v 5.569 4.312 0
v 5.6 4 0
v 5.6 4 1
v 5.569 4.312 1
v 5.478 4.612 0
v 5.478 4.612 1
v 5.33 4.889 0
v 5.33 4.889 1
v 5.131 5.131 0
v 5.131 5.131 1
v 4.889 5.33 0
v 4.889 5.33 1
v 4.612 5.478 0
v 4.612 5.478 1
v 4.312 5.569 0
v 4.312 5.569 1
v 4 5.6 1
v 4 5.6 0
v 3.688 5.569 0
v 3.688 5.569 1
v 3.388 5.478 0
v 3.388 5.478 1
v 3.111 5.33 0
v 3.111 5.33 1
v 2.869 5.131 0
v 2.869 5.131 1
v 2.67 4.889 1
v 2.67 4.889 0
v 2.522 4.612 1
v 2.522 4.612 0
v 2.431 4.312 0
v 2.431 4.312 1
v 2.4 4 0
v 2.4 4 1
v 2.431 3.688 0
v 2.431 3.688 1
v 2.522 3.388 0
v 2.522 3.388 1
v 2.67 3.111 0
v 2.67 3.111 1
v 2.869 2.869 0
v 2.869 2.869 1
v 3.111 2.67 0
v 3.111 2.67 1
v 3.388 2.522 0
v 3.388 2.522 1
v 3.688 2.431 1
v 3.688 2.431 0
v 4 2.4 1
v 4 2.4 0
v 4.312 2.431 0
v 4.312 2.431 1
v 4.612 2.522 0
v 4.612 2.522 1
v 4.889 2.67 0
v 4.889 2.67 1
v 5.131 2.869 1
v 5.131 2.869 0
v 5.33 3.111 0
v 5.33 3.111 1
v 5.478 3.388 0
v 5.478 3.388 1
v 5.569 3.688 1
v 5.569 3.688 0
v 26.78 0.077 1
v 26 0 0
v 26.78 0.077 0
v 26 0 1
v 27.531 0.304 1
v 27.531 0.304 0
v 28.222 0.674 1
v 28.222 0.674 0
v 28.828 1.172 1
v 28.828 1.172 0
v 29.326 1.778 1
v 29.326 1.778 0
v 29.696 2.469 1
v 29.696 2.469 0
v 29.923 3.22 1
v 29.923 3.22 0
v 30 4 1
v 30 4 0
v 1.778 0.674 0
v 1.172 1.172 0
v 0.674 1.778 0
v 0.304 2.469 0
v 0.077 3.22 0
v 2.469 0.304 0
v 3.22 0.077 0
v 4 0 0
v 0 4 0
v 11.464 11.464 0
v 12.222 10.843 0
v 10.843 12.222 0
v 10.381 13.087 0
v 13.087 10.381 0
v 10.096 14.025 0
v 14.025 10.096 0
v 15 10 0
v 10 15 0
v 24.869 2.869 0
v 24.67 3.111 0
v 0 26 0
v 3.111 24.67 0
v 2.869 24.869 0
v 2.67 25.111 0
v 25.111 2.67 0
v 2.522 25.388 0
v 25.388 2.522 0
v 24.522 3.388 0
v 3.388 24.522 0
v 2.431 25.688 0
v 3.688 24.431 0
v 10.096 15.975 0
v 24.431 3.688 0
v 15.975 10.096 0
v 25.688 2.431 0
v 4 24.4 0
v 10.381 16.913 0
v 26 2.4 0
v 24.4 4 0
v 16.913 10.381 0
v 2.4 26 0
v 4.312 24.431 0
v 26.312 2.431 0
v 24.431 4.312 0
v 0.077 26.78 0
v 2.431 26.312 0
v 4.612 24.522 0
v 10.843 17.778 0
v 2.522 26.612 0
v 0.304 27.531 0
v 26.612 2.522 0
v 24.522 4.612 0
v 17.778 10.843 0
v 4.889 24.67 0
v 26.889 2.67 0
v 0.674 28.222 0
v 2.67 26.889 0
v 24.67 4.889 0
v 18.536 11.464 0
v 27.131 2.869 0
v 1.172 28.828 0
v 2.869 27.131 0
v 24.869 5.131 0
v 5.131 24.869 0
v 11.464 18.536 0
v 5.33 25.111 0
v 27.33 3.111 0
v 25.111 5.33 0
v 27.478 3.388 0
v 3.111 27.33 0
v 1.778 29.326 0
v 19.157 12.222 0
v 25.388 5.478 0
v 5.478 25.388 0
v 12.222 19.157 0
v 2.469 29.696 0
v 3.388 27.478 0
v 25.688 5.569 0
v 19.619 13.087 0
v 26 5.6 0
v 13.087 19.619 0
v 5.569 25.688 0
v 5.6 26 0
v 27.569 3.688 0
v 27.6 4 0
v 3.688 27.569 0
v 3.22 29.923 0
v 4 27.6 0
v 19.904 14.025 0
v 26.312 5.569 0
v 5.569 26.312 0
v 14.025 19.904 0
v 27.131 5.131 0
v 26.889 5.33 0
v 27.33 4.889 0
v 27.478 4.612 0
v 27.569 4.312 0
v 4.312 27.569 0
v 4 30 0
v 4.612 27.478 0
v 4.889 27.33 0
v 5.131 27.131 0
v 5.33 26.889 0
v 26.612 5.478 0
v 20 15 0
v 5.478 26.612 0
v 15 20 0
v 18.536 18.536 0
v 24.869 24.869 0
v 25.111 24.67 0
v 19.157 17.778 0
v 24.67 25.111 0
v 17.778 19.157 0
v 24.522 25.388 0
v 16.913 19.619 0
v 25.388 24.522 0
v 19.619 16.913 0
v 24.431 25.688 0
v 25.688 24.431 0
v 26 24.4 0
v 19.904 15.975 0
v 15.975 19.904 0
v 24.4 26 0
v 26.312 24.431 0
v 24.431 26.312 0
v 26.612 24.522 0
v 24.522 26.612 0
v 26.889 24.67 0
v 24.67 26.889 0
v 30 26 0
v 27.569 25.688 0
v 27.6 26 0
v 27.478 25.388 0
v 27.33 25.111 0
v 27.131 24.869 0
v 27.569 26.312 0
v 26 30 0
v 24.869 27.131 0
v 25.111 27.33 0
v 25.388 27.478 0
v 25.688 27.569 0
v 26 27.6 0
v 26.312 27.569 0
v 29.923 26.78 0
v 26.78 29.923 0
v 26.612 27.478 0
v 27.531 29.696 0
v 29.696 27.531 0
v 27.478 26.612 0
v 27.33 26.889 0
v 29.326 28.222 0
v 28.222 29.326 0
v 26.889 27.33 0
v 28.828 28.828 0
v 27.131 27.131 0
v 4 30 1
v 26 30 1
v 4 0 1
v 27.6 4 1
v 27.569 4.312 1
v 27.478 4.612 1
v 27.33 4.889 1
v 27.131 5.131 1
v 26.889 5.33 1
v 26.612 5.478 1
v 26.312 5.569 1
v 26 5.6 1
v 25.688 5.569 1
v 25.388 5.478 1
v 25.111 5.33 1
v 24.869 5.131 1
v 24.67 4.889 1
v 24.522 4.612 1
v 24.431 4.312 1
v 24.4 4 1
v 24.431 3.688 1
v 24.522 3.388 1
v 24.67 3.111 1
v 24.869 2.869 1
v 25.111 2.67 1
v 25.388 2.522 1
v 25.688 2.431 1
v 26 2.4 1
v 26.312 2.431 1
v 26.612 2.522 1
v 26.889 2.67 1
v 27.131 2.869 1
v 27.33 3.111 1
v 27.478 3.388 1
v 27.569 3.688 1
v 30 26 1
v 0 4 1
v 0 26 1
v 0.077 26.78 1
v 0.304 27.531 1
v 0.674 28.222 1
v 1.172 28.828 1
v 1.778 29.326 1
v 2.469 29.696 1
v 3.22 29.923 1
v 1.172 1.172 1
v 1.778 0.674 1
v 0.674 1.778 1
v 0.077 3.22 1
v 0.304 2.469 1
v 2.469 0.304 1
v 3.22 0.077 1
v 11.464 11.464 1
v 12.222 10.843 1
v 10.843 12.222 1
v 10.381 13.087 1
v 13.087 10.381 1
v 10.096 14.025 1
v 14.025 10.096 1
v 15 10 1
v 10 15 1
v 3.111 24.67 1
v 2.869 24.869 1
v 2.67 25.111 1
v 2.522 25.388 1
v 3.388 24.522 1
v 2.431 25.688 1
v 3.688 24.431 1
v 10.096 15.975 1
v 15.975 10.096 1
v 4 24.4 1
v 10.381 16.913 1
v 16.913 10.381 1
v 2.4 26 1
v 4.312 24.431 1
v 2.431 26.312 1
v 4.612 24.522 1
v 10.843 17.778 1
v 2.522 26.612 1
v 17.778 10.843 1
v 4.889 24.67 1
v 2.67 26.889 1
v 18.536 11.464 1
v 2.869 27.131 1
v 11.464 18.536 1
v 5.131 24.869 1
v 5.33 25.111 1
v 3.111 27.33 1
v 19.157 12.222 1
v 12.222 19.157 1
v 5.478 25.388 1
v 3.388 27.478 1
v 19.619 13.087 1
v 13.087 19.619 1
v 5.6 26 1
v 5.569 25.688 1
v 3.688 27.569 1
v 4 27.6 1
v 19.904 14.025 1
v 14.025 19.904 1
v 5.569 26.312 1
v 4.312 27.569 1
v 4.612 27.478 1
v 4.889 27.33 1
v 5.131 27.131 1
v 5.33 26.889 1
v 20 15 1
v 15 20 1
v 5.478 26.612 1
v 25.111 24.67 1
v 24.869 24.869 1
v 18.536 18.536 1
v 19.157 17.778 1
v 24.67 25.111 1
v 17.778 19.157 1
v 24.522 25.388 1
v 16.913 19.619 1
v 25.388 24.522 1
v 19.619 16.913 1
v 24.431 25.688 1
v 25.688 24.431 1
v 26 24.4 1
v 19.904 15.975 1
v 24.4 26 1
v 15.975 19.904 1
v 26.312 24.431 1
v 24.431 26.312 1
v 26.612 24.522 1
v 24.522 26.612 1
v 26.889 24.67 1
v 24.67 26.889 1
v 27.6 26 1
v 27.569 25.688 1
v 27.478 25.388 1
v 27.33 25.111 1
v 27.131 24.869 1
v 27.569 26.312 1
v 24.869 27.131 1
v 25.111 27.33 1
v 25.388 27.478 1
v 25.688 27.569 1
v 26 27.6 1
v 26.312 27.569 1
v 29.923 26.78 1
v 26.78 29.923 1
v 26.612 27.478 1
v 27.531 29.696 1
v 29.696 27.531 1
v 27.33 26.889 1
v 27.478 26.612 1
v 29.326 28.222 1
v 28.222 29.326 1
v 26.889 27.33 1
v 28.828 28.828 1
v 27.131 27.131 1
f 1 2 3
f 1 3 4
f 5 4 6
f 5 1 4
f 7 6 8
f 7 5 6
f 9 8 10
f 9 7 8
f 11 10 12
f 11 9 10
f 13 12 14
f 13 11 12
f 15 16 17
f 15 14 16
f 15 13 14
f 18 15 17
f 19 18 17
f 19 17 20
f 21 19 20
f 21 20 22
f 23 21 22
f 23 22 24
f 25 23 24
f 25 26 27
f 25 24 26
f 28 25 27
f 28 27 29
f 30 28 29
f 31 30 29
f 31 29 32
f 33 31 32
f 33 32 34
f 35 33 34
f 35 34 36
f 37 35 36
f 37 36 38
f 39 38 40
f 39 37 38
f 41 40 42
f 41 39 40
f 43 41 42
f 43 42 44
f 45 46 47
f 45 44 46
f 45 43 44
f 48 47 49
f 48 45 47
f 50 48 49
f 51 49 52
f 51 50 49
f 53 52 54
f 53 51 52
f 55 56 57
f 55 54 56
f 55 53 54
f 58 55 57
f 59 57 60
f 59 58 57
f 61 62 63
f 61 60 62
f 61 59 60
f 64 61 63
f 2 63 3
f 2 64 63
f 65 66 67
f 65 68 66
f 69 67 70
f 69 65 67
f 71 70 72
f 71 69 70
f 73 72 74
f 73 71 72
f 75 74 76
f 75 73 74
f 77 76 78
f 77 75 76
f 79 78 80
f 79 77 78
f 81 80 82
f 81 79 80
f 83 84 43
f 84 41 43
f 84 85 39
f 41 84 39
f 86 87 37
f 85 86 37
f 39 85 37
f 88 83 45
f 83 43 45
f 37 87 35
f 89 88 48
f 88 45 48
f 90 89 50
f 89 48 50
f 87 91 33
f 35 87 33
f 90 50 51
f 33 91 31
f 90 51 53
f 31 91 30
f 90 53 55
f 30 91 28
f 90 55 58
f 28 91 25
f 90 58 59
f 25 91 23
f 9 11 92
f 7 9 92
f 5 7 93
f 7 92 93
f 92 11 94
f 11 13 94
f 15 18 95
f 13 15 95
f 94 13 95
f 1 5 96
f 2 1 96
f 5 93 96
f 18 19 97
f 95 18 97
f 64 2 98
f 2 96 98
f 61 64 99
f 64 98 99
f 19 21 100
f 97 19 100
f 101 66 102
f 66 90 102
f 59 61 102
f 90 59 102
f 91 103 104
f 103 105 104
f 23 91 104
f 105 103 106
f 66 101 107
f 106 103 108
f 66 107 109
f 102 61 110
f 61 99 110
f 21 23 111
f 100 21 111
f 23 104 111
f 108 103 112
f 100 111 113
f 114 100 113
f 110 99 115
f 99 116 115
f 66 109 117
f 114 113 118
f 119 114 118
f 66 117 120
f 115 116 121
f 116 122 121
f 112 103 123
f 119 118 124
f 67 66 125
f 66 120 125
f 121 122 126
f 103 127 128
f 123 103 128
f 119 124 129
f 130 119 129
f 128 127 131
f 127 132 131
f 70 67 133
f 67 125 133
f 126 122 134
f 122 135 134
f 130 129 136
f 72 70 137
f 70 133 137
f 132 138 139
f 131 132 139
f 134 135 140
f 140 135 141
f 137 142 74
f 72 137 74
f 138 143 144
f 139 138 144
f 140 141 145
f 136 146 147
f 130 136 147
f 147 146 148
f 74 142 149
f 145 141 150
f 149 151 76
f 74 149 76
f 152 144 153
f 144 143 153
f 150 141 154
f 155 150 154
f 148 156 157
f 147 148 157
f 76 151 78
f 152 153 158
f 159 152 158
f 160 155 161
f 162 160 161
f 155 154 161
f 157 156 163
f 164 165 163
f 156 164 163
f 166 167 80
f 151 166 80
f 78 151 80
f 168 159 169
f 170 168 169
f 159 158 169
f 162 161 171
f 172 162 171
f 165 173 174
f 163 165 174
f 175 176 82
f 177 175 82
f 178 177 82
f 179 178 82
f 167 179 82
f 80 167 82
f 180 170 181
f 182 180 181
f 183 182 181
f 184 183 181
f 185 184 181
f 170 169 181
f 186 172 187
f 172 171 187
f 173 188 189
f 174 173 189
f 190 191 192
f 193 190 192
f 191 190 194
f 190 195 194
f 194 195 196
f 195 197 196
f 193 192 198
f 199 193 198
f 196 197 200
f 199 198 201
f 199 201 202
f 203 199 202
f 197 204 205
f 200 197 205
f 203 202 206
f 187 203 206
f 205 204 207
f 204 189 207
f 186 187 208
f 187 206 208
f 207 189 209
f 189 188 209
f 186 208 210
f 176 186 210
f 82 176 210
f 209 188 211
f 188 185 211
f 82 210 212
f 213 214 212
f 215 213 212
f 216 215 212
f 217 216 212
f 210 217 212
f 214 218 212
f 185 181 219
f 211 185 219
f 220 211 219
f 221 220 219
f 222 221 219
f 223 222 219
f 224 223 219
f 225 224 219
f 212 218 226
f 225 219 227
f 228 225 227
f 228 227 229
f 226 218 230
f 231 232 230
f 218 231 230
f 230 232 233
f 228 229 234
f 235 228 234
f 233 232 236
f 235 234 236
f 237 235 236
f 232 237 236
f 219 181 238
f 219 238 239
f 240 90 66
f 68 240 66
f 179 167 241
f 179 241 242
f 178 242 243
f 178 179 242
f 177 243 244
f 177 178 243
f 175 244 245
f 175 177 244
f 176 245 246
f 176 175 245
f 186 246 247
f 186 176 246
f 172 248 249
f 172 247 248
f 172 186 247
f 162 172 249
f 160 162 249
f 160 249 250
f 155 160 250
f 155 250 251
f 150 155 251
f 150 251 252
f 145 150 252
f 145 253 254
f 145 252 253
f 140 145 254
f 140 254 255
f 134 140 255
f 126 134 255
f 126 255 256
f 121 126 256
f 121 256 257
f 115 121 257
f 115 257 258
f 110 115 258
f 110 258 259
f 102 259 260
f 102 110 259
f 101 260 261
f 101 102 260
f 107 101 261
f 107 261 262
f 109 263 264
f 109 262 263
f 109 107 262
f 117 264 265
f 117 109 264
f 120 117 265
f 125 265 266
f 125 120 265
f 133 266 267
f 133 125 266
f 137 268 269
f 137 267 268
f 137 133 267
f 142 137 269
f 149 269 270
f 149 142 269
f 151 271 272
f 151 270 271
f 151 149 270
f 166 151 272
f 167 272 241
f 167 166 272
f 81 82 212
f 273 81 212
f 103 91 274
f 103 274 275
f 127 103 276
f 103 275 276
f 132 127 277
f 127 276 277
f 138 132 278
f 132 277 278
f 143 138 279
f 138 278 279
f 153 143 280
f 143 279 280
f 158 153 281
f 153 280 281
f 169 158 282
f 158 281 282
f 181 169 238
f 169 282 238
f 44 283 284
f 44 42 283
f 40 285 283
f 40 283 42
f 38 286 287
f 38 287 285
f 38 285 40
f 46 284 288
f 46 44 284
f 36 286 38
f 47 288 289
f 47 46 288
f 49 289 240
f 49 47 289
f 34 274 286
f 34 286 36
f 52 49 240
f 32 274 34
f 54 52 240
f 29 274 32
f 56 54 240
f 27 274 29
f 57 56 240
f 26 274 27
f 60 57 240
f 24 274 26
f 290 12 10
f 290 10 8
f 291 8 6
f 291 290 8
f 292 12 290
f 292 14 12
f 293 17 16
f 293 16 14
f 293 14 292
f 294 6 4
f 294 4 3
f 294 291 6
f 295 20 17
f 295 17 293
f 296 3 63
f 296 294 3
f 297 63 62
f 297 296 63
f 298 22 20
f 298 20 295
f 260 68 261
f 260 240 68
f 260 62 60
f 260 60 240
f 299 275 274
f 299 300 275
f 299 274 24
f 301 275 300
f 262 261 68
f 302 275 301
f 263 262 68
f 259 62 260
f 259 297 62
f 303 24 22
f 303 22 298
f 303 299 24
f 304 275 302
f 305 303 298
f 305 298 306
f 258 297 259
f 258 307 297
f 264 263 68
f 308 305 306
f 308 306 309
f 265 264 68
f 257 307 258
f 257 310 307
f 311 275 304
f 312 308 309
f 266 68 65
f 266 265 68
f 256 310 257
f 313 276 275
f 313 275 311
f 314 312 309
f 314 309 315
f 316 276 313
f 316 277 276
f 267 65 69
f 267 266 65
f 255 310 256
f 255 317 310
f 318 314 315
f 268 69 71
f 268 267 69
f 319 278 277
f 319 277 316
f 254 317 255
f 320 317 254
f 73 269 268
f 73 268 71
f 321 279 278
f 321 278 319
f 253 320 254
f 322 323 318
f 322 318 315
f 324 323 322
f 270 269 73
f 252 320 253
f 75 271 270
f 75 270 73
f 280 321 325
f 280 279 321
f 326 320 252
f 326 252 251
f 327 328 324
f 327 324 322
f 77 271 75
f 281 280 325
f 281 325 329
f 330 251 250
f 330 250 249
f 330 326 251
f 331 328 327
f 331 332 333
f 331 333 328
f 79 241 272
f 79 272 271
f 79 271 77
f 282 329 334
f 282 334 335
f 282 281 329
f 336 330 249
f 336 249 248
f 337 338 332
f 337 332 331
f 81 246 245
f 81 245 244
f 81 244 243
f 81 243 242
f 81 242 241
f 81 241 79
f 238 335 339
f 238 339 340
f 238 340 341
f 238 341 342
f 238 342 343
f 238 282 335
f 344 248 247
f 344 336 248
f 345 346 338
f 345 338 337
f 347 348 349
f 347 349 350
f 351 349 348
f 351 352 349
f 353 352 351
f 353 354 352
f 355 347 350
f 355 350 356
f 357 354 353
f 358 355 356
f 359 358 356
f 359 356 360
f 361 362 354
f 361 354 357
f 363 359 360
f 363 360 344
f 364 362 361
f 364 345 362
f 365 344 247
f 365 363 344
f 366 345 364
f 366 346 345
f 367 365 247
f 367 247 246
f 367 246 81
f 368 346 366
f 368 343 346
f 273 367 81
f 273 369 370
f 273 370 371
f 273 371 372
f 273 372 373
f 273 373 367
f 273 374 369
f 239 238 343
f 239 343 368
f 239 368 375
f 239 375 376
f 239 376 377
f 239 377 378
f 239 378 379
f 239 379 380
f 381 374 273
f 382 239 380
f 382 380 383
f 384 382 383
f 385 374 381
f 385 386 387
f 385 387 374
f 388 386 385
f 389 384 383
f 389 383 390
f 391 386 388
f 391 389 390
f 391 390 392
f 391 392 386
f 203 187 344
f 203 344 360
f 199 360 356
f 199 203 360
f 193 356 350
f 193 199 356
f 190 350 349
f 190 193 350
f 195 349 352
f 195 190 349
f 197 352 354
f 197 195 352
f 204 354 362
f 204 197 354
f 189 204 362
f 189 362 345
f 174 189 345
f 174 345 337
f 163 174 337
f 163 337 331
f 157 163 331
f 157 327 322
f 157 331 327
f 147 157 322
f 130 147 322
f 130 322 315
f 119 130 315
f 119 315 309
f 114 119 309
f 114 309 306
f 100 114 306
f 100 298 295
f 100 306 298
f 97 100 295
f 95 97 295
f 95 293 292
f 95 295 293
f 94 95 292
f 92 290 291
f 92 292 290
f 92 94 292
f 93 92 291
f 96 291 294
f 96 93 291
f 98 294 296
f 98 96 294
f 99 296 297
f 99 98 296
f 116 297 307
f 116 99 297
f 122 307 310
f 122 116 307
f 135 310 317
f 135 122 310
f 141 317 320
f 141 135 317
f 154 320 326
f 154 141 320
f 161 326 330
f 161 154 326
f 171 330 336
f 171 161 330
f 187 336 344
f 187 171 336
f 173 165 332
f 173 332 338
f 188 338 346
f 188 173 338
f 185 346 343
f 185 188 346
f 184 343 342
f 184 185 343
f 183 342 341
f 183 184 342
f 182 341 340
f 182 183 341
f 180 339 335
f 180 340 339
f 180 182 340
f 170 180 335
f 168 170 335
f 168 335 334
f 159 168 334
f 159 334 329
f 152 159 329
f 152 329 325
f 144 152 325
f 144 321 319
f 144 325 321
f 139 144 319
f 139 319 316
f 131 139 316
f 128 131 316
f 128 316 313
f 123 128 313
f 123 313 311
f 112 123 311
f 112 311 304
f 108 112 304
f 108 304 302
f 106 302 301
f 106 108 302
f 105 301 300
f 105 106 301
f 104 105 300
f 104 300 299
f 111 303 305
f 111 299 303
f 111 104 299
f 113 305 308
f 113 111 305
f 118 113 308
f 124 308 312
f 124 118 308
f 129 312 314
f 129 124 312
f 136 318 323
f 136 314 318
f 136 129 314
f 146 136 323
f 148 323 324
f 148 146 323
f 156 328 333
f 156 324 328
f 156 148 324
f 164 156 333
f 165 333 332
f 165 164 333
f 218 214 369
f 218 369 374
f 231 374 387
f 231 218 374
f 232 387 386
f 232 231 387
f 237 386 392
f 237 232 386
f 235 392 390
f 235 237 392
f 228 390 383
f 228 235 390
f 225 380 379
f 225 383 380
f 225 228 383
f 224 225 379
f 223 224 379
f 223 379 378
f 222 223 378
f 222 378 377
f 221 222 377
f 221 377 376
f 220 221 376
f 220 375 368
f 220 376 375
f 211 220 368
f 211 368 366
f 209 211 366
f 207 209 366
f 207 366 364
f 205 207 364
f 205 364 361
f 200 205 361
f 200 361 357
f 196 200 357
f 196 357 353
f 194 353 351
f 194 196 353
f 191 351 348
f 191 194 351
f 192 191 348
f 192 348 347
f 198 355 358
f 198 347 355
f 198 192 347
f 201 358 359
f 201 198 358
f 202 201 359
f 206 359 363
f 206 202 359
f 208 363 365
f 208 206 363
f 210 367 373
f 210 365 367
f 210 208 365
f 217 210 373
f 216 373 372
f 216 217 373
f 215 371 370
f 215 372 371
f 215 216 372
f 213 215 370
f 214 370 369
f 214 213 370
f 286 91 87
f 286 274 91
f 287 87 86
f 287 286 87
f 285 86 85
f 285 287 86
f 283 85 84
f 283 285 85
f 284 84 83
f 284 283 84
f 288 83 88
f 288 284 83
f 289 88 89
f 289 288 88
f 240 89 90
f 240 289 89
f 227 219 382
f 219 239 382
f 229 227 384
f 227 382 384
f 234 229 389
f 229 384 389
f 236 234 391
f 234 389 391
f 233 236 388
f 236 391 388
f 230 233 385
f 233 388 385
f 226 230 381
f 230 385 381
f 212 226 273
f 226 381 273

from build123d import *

# Parameters (mm, degrees)
CYLINDER021_R       = 5
CYLINDER021_DEPTH   = 15
CYLINDER107_R       = 1.6
CYLINDER107_DEPTH   = 20
ARRAY001008_X_COUNT = 2
ARRAY001008_X_PITCH = 22
ARRAY001008_Y_COUNT = 2
ARRAY001008_Y_PITCH = 22
BOX009_W            = 30
BOX009_H            = 30
BOX009_DEPTH        = 1
FILLET004_R         = 4


with BuildPart() as side_bearing_central_hole_cylinder001:
    # Cylinder021 → Cylinder021 (new body)
    with BuildSketch(Plane(origin=(15, 15, -4), x_dir=(1, 0, 0), z_dir=(0, 0, 1))):
        Circle(CYLINDER021_R)
    extrude(amount=CYLINDER021_DEPTH)


with BuildPart() as fusion010:
    # Cylinder107 → Cylinder107 (new body)
    with BuildSketch(Plane(origin=(4, 4, -7), x_dir=(1, 0, 0), z_dir=(0, 0, 1))):
        Circle(CYLINDER107_R)
    extrude(amount=CYLINDER107_DEPTH)

    # Array001008 X: Fusion010 ×2


with BuildPart() as fusion010_1:
    add(fusion010.part)
    with Locations(*[(i * ARRAY001008_X_PITCH, 0, 0) for i in range(1, ARRAY001008_X_COUNT)]):
        add(fusion010.part)

    # Array001008 Y: Fusion010 ×2


with BuildPart() as fusion010_2:
    add(fusion010_1.part)
    with Locations(*[(0, i * ARRAY001008_Y_PITCH, 0) for i in range(1, ARRAY001008_Y_COUNT)]):
        add(fusion010_1.part)

    # Fusion010: union side bearing central hole cylinder001
    add(side_bearing_central_hole_cylinder001.part)


with BuildPart() as bearing_cover_fillet:
    # Box009 → Box009 (new body)
    with BuildSketch(Plane.XY):
        with Locations((15, 15)):
            Rectangle(BOX009_W, BOX009_H)
    extrude(amount=BOX009_DEPTH)

    # Cut007: cut Fusion010
    add(fusion010_2.part, mode=Mode.SUBTRACT)

    # Fillet004
    fillet004_edges = [bearing_cover_fillet.edges().sort_by_distance(p)[0] for p in [
        (0, 0, 0.5),
        (0, 30, 0.5),
        (30, 0, 0.5),
        (30, 30, 0.5),
    ]]
    fillet(fillet004_edges, radius=FILLET004_R)


solid = bearing_cover_fillet.part
